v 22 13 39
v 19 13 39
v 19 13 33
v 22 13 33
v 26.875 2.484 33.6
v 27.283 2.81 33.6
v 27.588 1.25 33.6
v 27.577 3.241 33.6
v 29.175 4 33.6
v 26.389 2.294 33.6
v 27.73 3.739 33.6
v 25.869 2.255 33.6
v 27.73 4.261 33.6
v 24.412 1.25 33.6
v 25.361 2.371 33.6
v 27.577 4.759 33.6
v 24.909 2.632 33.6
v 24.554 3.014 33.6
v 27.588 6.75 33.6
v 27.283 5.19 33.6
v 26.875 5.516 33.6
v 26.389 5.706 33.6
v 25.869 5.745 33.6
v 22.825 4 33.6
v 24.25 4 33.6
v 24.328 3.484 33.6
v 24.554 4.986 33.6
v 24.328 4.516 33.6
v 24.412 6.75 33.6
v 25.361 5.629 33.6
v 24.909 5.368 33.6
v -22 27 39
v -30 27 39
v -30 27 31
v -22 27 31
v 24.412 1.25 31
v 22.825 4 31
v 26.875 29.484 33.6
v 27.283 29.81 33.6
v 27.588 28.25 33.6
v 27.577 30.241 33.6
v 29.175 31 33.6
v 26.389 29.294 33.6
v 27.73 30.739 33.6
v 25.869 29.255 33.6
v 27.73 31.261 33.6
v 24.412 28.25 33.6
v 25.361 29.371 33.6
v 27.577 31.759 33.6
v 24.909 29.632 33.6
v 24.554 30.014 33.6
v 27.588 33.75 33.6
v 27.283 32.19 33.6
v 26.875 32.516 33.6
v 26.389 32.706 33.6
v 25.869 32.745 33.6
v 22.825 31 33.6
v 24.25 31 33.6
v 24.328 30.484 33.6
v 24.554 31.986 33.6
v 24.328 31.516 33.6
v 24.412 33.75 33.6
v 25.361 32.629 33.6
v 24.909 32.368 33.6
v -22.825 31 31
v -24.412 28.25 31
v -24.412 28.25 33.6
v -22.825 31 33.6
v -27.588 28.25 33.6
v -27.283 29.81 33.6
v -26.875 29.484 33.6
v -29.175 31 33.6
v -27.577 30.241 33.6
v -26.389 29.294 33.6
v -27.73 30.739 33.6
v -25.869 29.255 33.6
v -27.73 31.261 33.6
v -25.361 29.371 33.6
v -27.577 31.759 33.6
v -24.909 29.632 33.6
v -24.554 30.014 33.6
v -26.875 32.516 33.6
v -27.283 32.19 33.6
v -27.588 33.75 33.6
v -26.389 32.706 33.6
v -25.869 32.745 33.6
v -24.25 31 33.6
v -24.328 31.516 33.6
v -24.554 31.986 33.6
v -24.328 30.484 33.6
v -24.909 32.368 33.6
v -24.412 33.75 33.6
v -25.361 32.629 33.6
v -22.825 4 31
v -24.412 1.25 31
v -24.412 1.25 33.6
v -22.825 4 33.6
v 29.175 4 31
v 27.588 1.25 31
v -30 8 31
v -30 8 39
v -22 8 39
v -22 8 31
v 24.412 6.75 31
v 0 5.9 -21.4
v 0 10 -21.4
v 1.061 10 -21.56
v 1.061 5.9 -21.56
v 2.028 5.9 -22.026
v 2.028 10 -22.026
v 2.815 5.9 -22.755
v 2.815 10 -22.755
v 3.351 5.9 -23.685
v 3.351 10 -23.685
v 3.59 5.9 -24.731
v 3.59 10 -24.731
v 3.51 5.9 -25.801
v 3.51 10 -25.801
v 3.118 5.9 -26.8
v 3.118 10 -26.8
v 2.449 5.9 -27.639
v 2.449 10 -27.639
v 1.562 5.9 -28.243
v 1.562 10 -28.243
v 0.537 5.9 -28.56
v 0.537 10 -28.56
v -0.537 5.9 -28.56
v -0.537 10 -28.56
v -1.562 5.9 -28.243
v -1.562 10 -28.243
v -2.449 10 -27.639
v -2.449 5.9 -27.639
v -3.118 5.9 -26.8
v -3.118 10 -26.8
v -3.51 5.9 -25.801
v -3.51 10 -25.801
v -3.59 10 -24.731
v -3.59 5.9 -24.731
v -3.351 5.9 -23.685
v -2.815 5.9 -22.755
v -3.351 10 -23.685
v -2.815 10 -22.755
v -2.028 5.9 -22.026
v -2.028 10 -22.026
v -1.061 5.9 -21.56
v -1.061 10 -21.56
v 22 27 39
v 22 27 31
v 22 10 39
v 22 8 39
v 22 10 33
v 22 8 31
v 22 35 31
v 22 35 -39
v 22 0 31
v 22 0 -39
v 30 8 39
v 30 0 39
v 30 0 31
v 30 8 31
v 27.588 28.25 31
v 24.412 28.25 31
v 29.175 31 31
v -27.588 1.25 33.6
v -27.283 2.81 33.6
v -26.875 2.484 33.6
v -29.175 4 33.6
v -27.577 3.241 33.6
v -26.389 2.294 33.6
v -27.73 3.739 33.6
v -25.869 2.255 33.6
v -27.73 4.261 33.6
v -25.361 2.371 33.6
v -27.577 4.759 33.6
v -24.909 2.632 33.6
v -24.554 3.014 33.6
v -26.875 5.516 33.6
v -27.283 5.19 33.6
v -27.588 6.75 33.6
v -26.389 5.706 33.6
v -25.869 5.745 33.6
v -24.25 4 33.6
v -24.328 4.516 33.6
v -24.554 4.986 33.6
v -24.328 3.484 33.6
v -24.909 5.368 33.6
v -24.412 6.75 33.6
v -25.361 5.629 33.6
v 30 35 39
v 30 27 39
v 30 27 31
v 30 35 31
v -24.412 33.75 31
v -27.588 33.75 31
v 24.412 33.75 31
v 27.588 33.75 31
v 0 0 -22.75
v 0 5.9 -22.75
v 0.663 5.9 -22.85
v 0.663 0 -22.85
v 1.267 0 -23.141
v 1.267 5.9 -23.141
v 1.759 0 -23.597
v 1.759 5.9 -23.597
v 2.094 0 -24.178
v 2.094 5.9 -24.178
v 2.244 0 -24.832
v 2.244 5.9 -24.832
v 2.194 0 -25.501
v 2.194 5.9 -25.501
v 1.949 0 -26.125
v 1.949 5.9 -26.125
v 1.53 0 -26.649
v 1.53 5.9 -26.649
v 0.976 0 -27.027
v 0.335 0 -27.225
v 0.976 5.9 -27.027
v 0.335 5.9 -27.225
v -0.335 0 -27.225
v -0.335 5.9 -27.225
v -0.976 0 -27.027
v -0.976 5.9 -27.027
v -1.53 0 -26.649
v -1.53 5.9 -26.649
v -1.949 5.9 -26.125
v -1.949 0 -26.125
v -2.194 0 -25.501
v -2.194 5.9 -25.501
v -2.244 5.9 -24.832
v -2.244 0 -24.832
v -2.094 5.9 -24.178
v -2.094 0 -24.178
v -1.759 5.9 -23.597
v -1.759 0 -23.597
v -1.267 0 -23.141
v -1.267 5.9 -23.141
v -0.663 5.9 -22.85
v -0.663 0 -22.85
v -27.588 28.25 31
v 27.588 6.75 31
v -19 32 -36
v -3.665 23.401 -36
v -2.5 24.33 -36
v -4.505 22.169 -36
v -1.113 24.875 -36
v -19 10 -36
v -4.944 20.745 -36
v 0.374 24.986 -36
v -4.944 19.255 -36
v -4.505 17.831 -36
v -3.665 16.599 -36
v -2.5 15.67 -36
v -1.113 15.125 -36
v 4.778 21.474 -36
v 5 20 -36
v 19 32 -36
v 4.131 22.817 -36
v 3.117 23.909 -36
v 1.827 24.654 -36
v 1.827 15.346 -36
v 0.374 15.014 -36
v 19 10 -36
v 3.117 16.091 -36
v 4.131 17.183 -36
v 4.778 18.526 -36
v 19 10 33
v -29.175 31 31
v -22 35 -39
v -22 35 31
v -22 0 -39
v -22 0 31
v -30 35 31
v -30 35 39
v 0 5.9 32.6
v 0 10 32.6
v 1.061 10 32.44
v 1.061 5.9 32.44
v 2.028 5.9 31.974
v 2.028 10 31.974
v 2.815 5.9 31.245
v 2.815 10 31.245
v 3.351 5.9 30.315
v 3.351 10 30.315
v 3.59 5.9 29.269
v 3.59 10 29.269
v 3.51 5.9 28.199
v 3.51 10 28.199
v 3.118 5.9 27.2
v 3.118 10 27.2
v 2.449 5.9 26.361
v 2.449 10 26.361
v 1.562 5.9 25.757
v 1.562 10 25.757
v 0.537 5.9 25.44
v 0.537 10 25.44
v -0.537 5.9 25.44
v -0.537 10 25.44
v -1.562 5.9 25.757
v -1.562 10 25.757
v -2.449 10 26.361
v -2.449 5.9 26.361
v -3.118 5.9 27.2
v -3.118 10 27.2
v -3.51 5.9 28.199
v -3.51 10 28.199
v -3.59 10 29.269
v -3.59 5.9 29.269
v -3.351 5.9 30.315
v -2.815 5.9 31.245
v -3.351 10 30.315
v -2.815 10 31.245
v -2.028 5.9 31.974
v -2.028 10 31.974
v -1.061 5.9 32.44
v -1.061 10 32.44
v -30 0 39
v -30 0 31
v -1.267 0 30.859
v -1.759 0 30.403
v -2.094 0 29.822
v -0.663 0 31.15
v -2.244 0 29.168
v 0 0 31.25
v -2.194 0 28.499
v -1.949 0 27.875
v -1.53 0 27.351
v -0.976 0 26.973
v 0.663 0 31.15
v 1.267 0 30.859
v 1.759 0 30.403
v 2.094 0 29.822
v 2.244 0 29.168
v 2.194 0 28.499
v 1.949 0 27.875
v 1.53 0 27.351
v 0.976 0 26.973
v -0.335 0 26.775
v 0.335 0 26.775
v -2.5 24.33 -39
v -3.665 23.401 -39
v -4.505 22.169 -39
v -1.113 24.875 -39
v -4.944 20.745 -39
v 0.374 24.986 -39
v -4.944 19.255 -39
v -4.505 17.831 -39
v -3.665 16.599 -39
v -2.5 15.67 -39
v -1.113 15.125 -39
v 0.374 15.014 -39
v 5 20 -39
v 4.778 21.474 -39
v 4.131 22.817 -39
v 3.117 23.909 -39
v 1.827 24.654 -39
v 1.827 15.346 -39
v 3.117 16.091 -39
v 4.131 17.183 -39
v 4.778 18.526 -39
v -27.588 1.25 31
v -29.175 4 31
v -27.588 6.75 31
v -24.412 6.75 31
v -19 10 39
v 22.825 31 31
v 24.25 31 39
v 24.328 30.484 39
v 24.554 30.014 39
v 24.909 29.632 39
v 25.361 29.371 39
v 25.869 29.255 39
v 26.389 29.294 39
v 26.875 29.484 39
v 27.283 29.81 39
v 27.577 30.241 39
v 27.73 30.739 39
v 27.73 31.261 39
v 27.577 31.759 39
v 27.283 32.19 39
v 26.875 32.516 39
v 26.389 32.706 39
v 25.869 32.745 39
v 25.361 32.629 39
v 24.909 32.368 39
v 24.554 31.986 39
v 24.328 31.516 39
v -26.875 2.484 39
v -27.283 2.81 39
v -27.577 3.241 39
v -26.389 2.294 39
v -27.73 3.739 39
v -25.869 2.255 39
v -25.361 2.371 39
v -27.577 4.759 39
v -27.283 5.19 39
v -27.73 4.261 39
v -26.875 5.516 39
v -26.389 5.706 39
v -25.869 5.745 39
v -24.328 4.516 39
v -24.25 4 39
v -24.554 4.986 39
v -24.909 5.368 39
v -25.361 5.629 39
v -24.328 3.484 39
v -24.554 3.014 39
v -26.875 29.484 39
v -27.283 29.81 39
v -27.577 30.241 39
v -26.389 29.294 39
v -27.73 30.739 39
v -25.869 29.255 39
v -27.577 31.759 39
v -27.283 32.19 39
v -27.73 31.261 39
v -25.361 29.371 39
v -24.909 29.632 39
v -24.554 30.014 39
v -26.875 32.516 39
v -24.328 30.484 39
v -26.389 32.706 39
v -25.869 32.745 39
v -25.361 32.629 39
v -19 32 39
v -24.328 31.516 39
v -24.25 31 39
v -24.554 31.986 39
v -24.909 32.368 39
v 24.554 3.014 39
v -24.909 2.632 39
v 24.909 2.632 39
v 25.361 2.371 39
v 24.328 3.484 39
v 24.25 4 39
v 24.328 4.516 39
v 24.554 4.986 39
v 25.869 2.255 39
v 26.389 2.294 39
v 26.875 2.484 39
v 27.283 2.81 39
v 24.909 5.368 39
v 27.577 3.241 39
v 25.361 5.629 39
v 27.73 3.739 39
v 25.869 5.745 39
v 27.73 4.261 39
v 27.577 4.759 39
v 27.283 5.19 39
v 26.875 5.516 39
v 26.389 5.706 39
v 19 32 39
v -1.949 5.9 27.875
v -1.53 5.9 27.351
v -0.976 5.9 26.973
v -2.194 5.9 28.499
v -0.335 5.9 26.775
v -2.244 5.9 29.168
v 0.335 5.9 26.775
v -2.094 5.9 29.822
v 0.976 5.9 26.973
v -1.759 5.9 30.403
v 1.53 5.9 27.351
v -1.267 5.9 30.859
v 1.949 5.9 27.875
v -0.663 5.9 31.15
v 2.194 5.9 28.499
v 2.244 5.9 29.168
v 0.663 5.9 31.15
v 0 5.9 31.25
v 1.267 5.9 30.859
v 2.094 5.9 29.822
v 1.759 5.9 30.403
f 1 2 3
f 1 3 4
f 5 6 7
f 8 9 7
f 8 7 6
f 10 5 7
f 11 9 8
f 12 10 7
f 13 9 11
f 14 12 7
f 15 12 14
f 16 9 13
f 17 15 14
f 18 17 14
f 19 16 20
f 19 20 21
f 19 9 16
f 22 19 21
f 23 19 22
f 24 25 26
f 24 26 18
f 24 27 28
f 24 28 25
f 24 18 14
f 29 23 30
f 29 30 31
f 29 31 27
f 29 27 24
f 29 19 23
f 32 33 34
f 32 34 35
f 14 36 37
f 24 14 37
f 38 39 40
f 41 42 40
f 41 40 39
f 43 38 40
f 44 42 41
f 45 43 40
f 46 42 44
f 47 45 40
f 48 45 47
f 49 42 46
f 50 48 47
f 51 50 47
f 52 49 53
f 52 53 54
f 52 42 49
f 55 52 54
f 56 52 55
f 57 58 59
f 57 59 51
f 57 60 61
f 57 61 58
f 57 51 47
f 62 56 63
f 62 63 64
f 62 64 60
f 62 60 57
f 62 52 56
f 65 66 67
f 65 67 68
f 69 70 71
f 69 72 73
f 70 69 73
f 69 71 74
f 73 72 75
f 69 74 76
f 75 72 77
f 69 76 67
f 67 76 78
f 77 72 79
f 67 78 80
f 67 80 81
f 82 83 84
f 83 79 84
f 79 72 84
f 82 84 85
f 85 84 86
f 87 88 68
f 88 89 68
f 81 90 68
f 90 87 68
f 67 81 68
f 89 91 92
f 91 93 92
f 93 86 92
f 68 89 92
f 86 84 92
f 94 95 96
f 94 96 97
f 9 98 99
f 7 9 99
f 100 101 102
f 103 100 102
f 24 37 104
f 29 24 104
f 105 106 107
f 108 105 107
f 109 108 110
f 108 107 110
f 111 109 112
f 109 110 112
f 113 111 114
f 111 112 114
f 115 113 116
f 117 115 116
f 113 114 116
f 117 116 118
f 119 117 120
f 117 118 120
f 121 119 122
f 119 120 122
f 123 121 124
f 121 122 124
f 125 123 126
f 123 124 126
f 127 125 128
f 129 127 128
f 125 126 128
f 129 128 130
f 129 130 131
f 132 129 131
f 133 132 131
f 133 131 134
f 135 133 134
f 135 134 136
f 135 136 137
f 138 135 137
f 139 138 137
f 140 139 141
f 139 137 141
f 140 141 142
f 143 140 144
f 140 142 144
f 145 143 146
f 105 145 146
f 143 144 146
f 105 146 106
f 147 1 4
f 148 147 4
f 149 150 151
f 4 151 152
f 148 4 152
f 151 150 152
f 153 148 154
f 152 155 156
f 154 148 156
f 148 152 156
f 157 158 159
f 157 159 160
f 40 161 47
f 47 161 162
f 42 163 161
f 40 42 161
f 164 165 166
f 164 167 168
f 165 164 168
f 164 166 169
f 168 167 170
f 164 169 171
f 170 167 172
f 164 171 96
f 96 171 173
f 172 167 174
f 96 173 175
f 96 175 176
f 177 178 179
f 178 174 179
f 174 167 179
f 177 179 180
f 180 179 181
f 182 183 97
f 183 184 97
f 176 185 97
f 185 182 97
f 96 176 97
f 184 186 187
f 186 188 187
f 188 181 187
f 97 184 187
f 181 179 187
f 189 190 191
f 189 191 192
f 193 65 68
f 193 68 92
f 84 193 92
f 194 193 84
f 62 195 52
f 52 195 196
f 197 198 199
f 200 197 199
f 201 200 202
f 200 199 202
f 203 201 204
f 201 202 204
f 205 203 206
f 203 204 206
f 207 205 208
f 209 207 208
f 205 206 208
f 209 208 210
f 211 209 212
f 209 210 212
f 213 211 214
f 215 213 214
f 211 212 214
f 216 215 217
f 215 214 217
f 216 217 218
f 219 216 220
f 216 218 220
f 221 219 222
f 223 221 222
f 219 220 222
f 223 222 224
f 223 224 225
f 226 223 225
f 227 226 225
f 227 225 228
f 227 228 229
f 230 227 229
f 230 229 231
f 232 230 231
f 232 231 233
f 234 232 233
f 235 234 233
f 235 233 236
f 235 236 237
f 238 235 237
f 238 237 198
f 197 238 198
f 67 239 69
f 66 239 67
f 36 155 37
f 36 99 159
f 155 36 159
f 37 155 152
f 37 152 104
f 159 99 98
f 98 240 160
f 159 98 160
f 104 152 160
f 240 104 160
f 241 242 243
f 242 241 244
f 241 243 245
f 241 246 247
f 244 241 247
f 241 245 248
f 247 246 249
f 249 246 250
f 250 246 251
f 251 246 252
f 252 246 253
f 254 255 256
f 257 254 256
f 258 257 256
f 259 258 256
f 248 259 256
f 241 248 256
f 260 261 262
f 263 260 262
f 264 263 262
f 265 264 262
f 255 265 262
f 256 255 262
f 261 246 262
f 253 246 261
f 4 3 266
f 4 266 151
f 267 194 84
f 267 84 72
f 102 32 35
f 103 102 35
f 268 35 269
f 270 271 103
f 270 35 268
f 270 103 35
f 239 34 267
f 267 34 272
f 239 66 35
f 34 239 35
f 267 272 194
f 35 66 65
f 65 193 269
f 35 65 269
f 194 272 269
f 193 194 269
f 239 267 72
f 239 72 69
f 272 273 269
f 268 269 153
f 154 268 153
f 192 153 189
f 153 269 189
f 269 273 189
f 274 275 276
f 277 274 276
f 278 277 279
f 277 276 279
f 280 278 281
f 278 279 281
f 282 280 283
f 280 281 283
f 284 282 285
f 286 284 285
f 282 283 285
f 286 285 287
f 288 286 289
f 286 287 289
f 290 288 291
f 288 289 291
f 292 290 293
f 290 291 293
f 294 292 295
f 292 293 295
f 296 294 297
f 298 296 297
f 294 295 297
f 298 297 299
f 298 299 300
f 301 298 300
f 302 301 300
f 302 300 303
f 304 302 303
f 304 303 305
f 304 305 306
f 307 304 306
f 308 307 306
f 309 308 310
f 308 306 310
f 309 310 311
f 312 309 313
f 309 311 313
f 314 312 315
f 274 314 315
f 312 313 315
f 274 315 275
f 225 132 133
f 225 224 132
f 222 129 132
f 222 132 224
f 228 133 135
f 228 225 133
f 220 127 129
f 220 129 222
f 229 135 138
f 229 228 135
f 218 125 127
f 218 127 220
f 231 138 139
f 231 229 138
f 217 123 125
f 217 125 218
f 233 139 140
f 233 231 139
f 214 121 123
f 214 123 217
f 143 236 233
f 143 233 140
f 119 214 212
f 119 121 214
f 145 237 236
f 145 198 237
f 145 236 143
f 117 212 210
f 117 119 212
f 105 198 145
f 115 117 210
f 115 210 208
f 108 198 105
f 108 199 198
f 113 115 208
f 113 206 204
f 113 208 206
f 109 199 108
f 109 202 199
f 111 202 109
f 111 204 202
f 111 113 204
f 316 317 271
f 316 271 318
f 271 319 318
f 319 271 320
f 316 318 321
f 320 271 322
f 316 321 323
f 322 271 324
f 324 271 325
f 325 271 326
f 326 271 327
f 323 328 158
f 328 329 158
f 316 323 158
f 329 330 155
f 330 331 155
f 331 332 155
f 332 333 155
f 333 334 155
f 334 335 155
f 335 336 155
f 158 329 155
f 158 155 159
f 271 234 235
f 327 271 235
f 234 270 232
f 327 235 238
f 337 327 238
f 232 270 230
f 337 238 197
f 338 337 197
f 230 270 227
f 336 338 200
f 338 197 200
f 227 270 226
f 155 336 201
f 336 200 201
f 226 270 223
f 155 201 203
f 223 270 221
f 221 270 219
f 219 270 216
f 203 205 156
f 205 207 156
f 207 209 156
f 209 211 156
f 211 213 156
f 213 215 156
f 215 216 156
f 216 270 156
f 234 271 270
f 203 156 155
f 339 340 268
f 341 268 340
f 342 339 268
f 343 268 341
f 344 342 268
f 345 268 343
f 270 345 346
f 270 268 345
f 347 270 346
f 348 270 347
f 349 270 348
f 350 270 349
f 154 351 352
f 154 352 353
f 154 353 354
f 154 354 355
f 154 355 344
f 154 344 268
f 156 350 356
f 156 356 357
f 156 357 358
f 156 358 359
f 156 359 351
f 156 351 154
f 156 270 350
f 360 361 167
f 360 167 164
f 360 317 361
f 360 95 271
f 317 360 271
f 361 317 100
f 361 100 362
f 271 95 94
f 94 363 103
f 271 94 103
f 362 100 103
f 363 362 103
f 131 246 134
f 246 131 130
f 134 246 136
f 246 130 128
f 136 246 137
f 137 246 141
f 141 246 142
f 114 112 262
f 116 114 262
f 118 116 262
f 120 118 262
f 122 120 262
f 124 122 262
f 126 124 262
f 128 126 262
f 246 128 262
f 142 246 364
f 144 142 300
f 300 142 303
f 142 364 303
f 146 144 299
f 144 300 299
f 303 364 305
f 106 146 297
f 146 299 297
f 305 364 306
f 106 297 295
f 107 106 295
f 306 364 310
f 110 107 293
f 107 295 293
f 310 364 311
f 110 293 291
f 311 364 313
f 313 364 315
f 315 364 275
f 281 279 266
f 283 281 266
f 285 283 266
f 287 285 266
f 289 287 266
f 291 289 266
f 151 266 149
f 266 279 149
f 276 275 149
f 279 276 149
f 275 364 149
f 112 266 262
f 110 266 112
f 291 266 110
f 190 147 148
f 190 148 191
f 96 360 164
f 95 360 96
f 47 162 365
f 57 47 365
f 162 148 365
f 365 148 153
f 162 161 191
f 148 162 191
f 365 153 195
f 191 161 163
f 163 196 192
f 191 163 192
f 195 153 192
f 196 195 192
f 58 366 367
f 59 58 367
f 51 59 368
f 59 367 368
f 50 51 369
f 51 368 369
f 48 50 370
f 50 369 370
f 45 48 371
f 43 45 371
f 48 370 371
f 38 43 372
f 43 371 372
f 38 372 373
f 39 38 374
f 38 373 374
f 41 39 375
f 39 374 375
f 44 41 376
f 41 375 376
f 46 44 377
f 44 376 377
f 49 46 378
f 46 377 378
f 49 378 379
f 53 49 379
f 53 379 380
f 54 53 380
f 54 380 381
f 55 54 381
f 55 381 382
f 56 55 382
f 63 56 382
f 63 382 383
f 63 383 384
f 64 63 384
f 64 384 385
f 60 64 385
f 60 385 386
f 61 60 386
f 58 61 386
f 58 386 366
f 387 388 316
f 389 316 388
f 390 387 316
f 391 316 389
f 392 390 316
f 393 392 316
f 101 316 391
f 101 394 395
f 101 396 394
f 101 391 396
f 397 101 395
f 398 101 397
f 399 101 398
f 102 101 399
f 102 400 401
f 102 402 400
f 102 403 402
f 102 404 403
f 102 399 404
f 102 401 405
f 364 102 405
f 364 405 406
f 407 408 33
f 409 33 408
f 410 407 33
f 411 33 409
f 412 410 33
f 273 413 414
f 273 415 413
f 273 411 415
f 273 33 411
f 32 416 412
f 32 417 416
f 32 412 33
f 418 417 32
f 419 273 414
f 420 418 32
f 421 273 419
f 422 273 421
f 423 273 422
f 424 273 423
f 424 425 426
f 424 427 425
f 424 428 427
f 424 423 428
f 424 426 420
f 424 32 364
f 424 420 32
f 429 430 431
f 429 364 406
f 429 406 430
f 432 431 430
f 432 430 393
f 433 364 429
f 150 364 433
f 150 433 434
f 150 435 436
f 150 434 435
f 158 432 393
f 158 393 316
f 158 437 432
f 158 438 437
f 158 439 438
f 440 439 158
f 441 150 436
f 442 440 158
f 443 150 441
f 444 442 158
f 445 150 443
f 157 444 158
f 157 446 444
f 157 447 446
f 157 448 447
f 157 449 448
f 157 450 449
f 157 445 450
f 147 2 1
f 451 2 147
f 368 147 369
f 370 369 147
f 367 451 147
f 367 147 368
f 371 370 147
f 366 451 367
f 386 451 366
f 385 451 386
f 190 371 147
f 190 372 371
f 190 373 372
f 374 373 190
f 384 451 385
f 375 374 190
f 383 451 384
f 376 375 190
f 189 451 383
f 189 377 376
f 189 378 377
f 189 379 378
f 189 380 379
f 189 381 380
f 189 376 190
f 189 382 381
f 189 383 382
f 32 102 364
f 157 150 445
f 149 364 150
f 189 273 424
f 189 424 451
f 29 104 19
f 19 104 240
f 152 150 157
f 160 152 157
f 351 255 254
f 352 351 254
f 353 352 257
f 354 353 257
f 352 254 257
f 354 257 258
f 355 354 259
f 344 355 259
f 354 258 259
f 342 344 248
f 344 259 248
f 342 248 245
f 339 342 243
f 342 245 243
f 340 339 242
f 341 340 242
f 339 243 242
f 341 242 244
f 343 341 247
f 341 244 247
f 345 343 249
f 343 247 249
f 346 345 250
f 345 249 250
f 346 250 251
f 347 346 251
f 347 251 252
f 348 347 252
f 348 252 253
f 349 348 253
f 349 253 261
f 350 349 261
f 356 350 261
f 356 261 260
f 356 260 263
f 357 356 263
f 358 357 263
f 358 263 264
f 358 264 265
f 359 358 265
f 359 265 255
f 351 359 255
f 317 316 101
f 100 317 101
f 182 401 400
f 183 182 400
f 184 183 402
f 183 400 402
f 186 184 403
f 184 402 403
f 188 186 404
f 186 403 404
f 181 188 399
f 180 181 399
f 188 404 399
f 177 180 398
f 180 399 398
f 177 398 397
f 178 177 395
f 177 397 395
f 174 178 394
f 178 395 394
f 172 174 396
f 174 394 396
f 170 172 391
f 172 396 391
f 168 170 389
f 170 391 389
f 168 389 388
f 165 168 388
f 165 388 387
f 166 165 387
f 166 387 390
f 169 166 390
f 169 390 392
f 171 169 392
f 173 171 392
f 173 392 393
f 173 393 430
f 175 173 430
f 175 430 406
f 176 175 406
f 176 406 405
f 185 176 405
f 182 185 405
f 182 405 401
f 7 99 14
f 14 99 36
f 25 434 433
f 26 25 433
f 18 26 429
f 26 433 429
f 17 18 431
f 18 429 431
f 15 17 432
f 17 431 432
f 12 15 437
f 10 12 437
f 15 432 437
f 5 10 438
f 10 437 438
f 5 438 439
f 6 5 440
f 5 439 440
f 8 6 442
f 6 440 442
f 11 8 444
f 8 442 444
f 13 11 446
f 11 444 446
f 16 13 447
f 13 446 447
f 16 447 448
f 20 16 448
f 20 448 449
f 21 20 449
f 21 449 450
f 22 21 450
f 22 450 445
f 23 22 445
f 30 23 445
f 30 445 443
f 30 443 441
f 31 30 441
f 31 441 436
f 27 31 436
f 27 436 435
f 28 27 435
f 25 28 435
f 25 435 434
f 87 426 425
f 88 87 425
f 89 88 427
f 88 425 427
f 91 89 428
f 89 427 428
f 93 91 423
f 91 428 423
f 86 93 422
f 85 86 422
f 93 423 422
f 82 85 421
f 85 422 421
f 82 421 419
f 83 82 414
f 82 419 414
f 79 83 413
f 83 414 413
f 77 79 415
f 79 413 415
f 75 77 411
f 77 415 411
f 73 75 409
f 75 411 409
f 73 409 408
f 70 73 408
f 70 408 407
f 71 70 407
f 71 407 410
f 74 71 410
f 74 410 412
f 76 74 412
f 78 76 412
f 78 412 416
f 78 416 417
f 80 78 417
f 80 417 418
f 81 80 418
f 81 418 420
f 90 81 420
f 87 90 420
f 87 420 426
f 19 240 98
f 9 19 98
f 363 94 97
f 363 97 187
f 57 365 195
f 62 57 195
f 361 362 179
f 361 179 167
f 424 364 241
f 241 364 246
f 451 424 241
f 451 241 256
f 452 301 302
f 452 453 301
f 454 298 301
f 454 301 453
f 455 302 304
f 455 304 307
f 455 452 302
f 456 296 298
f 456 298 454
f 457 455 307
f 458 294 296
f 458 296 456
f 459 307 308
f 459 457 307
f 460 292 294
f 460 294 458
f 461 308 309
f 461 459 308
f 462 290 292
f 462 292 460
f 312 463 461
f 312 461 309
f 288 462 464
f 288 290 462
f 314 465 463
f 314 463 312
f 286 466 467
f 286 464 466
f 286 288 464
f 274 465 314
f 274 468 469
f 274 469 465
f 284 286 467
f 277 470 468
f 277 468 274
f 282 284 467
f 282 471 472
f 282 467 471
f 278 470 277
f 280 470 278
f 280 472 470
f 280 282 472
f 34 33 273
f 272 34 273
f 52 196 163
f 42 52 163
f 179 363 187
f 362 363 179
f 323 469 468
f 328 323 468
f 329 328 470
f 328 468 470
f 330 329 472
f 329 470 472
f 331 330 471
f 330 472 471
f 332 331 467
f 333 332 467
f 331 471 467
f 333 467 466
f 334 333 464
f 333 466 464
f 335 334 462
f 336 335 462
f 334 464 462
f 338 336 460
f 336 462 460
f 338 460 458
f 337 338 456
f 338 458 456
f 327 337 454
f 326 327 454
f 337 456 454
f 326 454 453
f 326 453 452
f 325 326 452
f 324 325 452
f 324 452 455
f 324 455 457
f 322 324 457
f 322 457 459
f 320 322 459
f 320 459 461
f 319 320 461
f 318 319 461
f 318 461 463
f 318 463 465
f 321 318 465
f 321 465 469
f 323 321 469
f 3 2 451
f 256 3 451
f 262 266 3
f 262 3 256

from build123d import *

# Parameters (mm, degrees)
SKETCH_1_W                 = 44
SKETCH_1_H                 = 78
EXTRUDE_1_DEPTH            = 35
SHELL_1_T                  = -3
SHELL_1_THICKNESS_2_FACE_W = 75
SHELL_1_THICKNESS_2_FACE_H = 38
SHELL_1_THICKNESS_2_DEPTH  = 7
SKETCH_3_R                 = 3.6
CUT_EXTRUDE_1_DEPTH        = 4.1
CUT_EXTRUDE_2_REACH        = 53.284
SKETCH_4_R                 = 2.25
SKETCH_5_W                 = 3
SKETCH_5_H                 = 3
CUT_EXTRUDE_3_DEPTH        = 6
SKETCH_6_W                 = 8
SKETCH_6_H                 = 8
SKETCH_6_R                 = 1.75
EXTRUDE_2_DEPTH            = 8
CUT_EXTRUDE_4_DEPTH        = 2.6
CUT_EXTRUDE_5_REACH        = 90.034
SKETCH_8_R                 = 5


with BuildPart() as part:
    # 草圖1 → 填料-伸長1 (new body)
    with BuildSketch(Plane(origin=(0, 0, 0), x_dir=(1, 0, 0), z_dir=(0, 1, 0))):
        Rectangle(SKETCH_1_W, SKETCH_1_H)
    extrude(amount=EXTRUDE_1_DEPTH)

    # 薄殼1
    shell_1_openings = [part.faces().sort_by_distance(p)[0] for p in [
        (0, 17.5, 39),
    ]]
    offset(amount=SHELL_1_T, openings=shell_1_openings, kind=Kind.INTERSECTION)

    # 薄殼1 thickness 2 face (on inner face of the shell) → 薄殼1 thickness 2 (add)
    with BuildSketch(Plane(origin=(0, 3, 1.5), x_dir=(0, 0, -1), z_dir=(0, -1, 0))):
        Rectangle(SHELL_1_THICKNESS_2_FACE_W, SHELL_1_THICKNESS_2_FACE_H)
    extrude(amount=-SHELL_1_THICKNESS_2_DEPTH)

    # 草圖3 → 除料-伸長1 (cut)
    with BuildSketch(Plane(origin=(0, 10, 0), x_dir=(1, 0, 0), z_dir=(0, 1, 0))):
        with Locations(Location((0, 25, 0), (0, 0, 270))):
            Circle(SKETCH_3_R)
        with Locations(Location((0, -29, 0), (0, 0, 270))):
            Circle(SKETCH_3_R)
    extrude(amount=-CUT_EXTRUDE_1_DEPTH, mode=Mode.SUBTRACT)

    # 草圖4 → 除料-伸長2 (cut, up to next)
    with BuildSketch(Plane(origin=(0, 10, 0), x_dir=(1, 0, 0), z_dir=(0, 1, 0)), mode=Mode.PRIVATE) as cut_extrude_2_sk1:
        with Locations(Location((0, 25, 0), (0, 0, 270))):
            Circle(SKETCH_4_R)
    cut_extrude_2_tool1 = extrude(cut_extrude_2_sk1.sketch, amount=-CUT_EXTRUDE_2_REACH, mode=Mode.PRIVATE) & part.part
    # 草圖4 → 除料-伸長2 (cut, up to next)
    with BuildSketch(Plane(origin=(0, 10, 0), x_dir=(1, 0, 0), z_dir=(0, 1, 0)), mode=Mode.PRIVATE) as cut_extrude_2_sk2:
        with Locations(Location((0, -29, 0), (0, 0, 270))):
            Circle(SKETCH_4_R)
    cut_extrude_2_tool2 = extrude(cut_extrude_2_sk2.sketch, amount=-CUT_EXTRUDE_2_REACH, mode=Mode.PRIVATE) & part.part
    add(cut_extrude_2_tool1.solids().sort_by_distance((0, 10, -25))[0], mode=Mode.SUBTRACT)
    add(cut_extrude_2_tool2.solids().sort_by_distance((0, 10, 29))[0], mode=Mode.SUBTRACT)

    # 草圖5 → 除料-伸長3 (cut)
    with BuildSketch(Plane.XY.offset(39)):
        with Locations((20.5, 11.5)):
            Rectangle(SKETCH_5_W, SKETCH_5_H)
    extrude(amount=-CUT_EXTRUDE_3_DEPTH, mode=Mode.SUBTRACT)

    # 草圖6 → 填料-伸長2 (add)
    with BuildSketch(Plane.XY.offset(39)):
        with Locations((-26, 31)):
            Rectangle(SKETCH_6_W, SKETCH_6_H)
        with Locations((-26, 31)):
            Circle(SKETCH_6_R, mode=Mode.SUBTRACT)
        with Locations((-26, 4)):
            Rectangle(SKETCH_6_W, SKETCH_6_H)
        with Locations((-26, 4)):
            Circle(SKETCH_6_R, mode=Mode.SUBTRACT)
        with Locations((26, 4)):
            Rectangle(SKETCH_6_W, SKETCH_6_H)
        with Locations(Location((26, 4, 0), (0, 0, 180))):
            Circle(SKETCH_6_R, mode=Mode.SUBTRACT)
        with Locations((26, 31)):
            Rectangle(SKETCH_6_W, SKETCH_6_H)
        with Locations(Location((26, 31, 0), (0, 0, 180))):
            Circle(SKETCH_6_R, mode=Mode.SUBTRACT)
    extrude(amount=-EXTRUDE_2_DEPTH)

    # 草圖7 → 除料-伸長4 (cut)
    with BuildSketch(Plane(origin=(0, 0, 31), x_dir=(-1, 0, 0), z_dir=(0, 0, -1))):
        Polygon((27.58771324, 6.75), (29.175426481, 4), (27.58771324, 1.25), (24.41228676, 1.25), (22.824573519, 4), (24.41228676, 6.75), align=None)
        Polygon((-22.824573519, 31), (-24.41228676, 33.75), (-27.58771324, 33.75), (-29.175426481, 31), (-27.58771324, 28.25), (-24.41228676, 28.25), align=None)
        Polygon((-29.175426481, 4), (-27.58771324, 1.25), (-24.41228676, 1.25), (-22.824573519, 4), (-24.41228676, 6.75), (-27.58771324, 6.75), align=None)
        Polygon((24.41228676, 28.25), (22.824573519, 31), (24.41228676, 33.75), (27.58771324, 33.75), (29.175426481, 31), (27.58771324, 28.25), align=None)
    extrude(amount=-CUT_EXTRUDE_4_DEPTH, mode=Mode.SUBTRACT)

    # 草圖8 → 除料-伸長5 (cut, up to next)
    with BuildSketch(Plane.XY.offset(-36), mode=Mode.PRIVATE) as cut_extrude_5_sk1:
        with Locations((0, 20)):
            Circle(SKETCH_8_R)
    cut_extrude_5_tool1 = extrude(cut_extrude_5_sk1.sketch, amount=-CUT_EXTRUDE_5_REACH, mode=Mode.PRIVATE) & part.part
    add(cut_extrude_5_tool1.solids().sort_by_distance((0, 20, -36))[0], mode=Mode.SUBTRACT)


solid = part.part
